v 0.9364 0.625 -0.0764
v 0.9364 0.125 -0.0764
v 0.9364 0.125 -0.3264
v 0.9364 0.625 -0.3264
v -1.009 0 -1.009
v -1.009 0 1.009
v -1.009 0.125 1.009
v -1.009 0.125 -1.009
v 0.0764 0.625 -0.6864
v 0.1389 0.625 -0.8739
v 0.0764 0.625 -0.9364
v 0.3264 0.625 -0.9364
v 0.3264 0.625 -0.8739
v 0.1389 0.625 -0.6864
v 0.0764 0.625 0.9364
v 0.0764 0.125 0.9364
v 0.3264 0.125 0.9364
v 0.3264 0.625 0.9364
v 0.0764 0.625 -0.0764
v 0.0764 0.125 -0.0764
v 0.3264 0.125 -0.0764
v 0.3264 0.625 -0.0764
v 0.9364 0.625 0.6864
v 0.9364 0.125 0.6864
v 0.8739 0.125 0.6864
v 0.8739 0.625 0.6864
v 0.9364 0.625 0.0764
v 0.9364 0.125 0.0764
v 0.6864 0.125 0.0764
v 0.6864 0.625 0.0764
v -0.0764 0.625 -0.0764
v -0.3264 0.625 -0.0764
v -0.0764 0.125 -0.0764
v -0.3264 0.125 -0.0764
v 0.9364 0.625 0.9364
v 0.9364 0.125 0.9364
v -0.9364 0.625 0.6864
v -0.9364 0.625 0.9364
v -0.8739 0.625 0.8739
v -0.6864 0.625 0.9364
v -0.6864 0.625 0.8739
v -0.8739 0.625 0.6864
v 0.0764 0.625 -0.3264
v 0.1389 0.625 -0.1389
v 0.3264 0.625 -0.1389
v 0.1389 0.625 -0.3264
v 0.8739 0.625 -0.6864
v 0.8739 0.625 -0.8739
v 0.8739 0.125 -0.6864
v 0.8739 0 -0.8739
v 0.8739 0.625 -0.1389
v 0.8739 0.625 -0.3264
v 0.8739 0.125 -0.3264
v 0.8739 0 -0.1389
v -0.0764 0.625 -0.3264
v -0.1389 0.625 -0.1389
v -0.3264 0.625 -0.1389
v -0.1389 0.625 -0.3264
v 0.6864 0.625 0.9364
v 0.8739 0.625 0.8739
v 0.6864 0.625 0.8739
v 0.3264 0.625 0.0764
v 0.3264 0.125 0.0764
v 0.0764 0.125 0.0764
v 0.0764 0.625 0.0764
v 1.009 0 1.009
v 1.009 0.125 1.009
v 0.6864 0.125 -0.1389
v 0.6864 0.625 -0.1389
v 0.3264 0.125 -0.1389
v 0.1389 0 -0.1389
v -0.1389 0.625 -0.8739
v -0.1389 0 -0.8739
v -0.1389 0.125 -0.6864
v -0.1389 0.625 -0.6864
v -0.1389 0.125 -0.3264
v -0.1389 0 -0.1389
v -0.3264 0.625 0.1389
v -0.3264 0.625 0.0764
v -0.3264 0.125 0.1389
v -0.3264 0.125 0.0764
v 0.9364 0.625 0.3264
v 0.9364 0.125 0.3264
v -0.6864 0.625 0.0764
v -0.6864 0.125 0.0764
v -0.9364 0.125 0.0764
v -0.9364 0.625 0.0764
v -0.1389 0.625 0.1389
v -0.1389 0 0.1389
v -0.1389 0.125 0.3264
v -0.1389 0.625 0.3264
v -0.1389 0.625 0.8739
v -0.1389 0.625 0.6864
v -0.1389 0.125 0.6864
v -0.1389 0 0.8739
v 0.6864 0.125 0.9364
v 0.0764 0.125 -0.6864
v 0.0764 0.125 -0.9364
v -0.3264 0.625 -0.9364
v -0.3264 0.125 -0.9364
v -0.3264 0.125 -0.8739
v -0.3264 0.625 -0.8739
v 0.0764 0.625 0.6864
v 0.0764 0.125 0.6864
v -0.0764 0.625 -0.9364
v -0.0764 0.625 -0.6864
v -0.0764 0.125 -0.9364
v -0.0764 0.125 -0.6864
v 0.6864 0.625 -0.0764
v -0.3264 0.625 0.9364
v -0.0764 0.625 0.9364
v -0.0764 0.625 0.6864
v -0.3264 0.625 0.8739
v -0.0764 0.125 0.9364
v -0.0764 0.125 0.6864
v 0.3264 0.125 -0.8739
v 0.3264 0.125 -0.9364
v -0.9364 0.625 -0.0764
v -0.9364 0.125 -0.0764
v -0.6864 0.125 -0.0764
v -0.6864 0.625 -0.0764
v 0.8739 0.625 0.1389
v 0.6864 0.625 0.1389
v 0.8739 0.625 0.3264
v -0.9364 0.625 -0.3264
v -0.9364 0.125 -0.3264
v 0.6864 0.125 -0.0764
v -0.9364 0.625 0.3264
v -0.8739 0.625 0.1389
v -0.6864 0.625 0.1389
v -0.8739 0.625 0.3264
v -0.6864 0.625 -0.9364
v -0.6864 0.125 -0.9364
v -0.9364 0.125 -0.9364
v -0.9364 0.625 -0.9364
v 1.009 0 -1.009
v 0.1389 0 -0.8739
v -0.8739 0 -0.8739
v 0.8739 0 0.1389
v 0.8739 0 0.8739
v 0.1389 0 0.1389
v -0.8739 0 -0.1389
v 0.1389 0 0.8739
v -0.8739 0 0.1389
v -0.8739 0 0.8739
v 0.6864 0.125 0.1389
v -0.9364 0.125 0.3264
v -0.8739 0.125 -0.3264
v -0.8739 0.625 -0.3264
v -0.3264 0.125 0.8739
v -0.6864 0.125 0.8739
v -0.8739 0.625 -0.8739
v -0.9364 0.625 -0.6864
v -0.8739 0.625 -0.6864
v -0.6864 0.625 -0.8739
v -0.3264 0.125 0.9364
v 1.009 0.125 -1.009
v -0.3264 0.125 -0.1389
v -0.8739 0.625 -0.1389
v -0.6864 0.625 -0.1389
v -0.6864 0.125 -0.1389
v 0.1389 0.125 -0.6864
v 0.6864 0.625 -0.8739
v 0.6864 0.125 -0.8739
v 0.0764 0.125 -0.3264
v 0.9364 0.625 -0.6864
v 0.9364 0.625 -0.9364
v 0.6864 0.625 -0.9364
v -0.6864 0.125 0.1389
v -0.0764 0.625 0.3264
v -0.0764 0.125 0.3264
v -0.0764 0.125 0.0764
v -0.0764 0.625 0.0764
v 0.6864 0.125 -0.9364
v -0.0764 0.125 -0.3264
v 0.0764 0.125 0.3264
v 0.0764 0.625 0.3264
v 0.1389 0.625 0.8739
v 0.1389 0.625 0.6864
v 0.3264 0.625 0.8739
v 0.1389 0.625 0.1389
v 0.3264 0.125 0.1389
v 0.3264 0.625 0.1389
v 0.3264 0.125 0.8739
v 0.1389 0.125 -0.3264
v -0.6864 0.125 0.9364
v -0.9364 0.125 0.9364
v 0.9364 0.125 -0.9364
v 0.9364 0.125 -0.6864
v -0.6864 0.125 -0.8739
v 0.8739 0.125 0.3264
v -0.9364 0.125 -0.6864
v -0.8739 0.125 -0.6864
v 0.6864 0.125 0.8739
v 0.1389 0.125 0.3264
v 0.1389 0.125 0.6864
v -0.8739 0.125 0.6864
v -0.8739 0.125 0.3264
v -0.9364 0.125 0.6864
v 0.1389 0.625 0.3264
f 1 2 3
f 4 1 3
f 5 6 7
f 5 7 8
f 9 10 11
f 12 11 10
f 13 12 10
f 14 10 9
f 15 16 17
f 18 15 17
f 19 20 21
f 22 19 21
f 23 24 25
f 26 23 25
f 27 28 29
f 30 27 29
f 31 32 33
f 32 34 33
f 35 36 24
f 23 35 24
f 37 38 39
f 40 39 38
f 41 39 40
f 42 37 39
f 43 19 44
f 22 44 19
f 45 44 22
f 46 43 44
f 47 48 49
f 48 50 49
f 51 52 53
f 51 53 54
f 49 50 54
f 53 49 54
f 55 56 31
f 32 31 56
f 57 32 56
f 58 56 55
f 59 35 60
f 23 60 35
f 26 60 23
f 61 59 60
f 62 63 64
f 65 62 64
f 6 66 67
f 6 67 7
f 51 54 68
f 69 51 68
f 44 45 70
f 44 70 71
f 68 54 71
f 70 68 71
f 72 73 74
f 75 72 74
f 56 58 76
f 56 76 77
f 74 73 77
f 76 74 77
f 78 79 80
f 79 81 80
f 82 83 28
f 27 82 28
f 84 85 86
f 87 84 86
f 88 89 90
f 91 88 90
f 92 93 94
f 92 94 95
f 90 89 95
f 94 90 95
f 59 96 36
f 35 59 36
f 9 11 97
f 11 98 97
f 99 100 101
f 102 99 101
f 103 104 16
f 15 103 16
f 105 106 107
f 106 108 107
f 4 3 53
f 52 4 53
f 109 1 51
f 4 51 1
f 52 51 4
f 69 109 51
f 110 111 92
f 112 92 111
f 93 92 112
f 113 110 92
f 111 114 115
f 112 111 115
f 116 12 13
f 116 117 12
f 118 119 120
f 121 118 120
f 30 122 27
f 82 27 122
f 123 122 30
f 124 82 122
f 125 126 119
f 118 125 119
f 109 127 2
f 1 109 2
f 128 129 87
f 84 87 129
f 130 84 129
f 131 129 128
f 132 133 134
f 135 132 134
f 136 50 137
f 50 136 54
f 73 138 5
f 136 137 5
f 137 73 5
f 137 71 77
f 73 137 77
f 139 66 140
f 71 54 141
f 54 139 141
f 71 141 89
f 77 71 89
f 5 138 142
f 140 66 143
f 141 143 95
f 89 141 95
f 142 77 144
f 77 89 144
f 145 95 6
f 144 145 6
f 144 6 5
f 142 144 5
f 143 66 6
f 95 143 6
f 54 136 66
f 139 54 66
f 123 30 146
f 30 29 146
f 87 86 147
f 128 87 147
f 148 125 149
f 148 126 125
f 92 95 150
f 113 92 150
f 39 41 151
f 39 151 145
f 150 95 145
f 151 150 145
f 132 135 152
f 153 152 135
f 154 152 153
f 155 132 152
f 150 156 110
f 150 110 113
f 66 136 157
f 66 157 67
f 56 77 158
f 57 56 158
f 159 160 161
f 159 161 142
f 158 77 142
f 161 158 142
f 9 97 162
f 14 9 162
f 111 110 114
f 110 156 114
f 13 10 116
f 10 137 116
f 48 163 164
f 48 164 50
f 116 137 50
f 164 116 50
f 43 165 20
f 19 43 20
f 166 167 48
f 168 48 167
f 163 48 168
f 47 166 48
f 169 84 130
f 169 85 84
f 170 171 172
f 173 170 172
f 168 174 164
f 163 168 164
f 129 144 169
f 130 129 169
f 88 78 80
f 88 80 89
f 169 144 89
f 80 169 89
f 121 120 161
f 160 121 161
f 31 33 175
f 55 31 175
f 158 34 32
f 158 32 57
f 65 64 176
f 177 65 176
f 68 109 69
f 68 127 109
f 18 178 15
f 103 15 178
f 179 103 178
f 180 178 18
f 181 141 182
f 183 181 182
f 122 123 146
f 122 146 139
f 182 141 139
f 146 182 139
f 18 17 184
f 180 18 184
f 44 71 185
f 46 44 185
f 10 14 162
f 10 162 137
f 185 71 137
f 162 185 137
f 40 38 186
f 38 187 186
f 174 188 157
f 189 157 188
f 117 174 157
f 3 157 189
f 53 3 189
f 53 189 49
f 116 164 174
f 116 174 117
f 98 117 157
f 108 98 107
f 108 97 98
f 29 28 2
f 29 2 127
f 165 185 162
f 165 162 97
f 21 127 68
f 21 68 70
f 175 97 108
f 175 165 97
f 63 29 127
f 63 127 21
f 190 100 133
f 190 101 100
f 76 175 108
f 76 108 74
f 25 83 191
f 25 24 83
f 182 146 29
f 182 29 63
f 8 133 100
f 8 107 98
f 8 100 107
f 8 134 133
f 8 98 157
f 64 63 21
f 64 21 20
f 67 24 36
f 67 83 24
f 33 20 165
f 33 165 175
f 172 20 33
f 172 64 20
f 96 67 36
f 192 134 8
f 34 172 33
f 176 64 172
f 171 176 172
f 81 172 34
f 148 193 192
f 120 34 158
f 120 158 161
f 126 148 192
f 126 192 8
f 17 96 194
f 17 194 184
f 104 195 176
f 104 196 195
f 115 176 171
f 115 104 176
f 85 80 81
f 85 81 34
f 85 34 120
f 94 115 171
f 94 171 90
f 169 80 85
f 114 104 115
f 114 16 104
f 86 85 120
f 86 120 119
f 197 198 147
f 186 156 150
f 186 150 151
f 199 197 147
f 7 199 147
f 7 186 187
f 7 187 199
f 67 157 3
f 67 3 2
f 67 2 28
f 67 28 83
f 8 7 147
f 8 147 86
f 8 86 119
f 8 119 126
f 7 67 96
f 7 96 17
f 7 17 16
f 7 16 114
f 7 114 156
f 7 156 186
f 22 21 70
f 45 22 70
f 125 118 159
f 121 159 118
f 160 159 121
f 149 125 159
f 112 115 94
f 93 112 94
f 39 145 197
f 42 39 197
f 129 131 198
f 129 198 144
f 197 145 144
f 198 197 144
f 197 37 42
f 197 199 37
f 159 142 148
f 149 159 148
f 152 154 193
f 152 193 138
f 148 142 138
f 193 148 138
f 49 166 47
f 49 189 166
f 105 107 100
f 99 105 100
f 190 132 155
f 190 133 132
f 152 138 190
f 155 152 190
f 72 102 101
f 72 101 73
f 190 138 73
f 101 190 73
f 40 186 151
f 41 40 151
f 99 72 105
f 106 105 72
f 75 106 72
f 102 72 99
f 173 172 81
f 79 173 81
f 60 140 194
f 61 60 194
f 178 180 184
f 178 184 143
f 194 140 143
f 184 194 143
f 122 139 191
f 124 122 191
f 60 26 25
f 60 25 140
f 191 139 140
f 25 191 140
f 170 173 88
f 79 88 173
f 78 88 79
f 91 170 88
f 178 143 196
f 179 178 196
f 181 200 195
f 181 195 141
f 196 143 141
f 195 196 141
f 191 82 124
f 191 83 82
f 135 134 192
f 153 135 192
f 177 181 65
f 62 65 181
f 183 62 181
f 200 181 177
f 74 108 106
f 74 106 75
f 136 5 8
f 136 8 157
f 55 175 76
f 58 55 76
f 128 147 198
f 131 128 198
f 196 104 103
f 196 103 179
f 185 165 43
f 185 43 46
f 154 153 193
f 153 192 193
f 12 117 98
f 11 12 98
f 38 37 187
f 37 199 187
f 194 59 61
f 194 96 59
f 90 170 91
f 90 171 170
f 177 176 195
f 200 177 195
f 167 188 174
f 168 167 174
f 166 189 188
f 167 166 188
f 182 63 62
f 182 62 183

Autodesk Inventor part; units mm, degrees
ref_plane "YZ Plane" through (0, 0, 0) normal (1, 0, 0) x (0, 1, 0)
ref_plane "XZ Plane" through (0, 0, 0) normal (0, 1, 0) x (-1, 0, 0)
ref_plane "XY Plane" through (0, 0, 0) normal (0, 0, 1) x (1, 0, 0)
sketch "Sketch1" plane through (0, 0, 0) normal (0, 1, 0) x (-1, 0, 0)
  line L0 (-1.009, 1.009) -> (1.009, 1.009)
  line L1 (1.009, 1.009) -> (1.009, -1.009)
  line L2 (1.009, -1.009) -> (-1.009, -1.009)
  line L3 (-1.009, -1.009) -> (-1.009, 1.009)
  line L4 (-1.009, 1.009) -> (1.009, -1.009) construction
  line L5 (1.009, 1.009) -> (-1.009, -1.009) construction
  line L6 (0.9364, 0.9364) -> (0.0764, 0.9364)
  line L7 (0.0764, 0.9364) -> (0.0764, 0.0764)
  line L8 (0.0764, 0.0764) -> (0.9364, 0.0764)
  line L9 (0.9364, 0.0764) -> (0.9364, 0.9364)
  line L10 (0, 0) -> (0.3282, 0)
  line L11 (0.8739, 0.8739) -> (0.1389, 0.8739)
  line L12 (0.1389, 0.8739) -> (0.1389, 0.1389)
  line L13 (0.1389, 0.1389) -> (0.8739, 0.1389)
  line L14 (0.8739, 0.1389) -> (0.8739, 0.8739)
  line L15 (-1.009, 1.009) -> (1.009, -1.009) construction
  line L16 (-0.0764, 0.9364) -> (-0.9364, 0.9364)
  line L17 (-0.1389, 0.8739) -> (-0.8739, 0.8739)
  line L18 (-0.8739, 0.8739) -> (-0.8739, 0.1389)
  line L19 (-0.8739, 0.1389) -> (-0.1389, 0.1389)
  line L20 (-0.9364, 0.9364) -> (-0.9364, 0.0764)
  line L21 (-0.9364, 0.0764) -> (-0.0764, 0.0764)
  line L22 (-0.0764, 0.0764) -> (-0.0764, 0.9364)
  line L23 (-0.1389, 0.1389) -> (-0.1389, 0.8739)
  line L24 (-1.009, -1.009) -> (1.009, 1.009) construction
  line L25 (-0.9364, -0.0764) -> (-0.9364, -0.9364)
  line L26 (-0.8739, -0.1389) -> (-0.8739, -0.8739)
  line L27 (-0.8739, -0.8739) -> (-0.1389, -0.8739)
  line L28 (-0.1389, -0.8739) -> (-0.1389, -0.1389)
  line L29 (-0.9364, -0.9364) -> (-0.0764, -0.9364)
  line L30 (-0.0764, -0.9364) -> (-0.0764, -0.0764)
  line L31 (-0.0764, -0.0764) -> (-0.9364, -0.0764)
  line L32 (-0.1389, -0.1389) -> (-0.8739, -0.1389)
  line L33 (1.009, -1.009) -> (-1.009, 1.009) construction
  line L34 (0.0764, -0.9364) -> (0.9364, -0.9364)
  line L35 (0.1389, -0.8739) -> (0.8739, -0.8739)
  line L36 (0.8739, -0.8739) -> (0.8739, -0.1389)
  line L37 (0.8739, -0.1389) -> (0.1389, -0.1389)
  line L38 (0.9364, -0.9364) -> (0.9364, -0.0764)
  line L39 (0.9364, -0.0764) -> (0.0764, -0.0764)
  line L40 (0.0764, -0.0764) -> (0.0764, -0.9364)
  line L41 (0.1389, -0.1389) -> (0.1389, -0.8739)
  dimension "d0" = 2.018
  dimension "d2" = 0.1529
  dimension "d3" = 0.86
  dimension "d4" = 0.0625
  dimension "d7" = 360
extrude "Extrusion1" add sketch "Sketch1" along normal blind 0.125 contours L0 L1 L2 L3 | L9 L8 L7 L6 | L22 L21 L20 L16 | L31 L30 L29 L25 | L40 L39 L38 L34
sketch "Sketch2" plane through (0, 0.125, 0) normal (0, 1, 0) x (1, 0, 0)
  line L0 (1.009, 1.009) -> (-1.009, 1.009) projected
  line L1 (-1.009, 1.009) -> (-1.009, -1.009) projected
  line L2 (-1.009, -1.009) -> (1.009, -1.009) projected
  line L3 (1.009, -1.009) -> (1.009, 1.009) projected
  line L4 (-0.8739, -0.8739) -> (-0.8739, -0.1389) projected
  line L5 (-0.8739, -0.1389) -> (-0.1389, -0.1389) projected
  line L6 (-0.1389, -0.1389) -> (-0.1389, -0.8739) projected
  line L7 (-0.1389, -0.8739) -> (-0.8739, -0.8739) projected
  line L8 (0.1389, -0.8739) -> (0.1389, -0.1389) projected
  line L9 (0.1389, -0.1389) -> (0.8739, -0.1389) projected
  line L10 (0.8739, -0.1389) -> (0.8739, -0.8739) projected
  line L11 (0.8739, -0.8739) -> (0.1389, -0.8739) projected
  line L12 (0.8739, 0.1389) -> (0.1389, 0.1389) projected
  line L13 (0.1389, 0.1389) -> (0.1389, 0.8739) projected
  line L14 (0.1389, 0.8739) -> (0.8739, 0.8739) projected
  line L15 (0.8739, 0.8739) -> (0.8739, 0.1389) projected
  line L16 (-0.1389, 0.8739) -> (-0.1389, 0.1389) projected
  line L17 (-0.1389, 0.1389) -> (-0.8739, 0.1389) projected
  line L18 (-0.8739, 0.1389) -> (-0.8739, 0.8739) projected
  line L19 (-0.8739, 0.8739) -> (-0.1389, 0.8739) projected
  line L20 (-0.9364, -0.0764) -> (-0.9364, -0.9364)
  line L21 (-0.9364, -0.9364) -> (-0.0764, -0.9364)
  line L22 (-0.0764, -0.9364) -> (-0.0764, -0.0764)
  line L23 (-0.0764, -0.0764) -> (-0.9364, -0.0764)
  line L24 (-0.9364, -0.6864) -> (-0.8739, -0.6864)
  line L25 (-0.6864, -0.9364) -> (-0.6864, -0.8739)
  point P0 (0, 0)
  point P1 (-0.9052, -0.6864)
  dimension "d11" = 0.0625
  dimension "d12" = 0.25
  dimension "d13" = 0.25
extrude "Extrusion2" add sketch "Sketch2" along normal blind 0.5 contours L7 L25 L21 L20 L24 L4
sketch "Sketch3" plane through (0, 0.125, 0) normal (0, 1, 0) x (1, 0, 0)
  line L0 (-0.1389, -0.1389) -> (-0.1389, -0.8739) projected
  line L1 (-0.8739, -0.1389) -> (-0.1389, -0.1389) projected
  line L2 (-0.1389, -0.8739) -> (-0.8739, -0.1389) construction
  line L3 (-0.5064, -0.5064) -> (-0.1389, -0.1389) construction
  point P0 (0, 0)
pattern_circular "Circular Pattern1" count 4 over 360 about axis through (-0.5064, 0.125, 0.5064) along (0, 1, 0) of "Extrusion2"
pattern_circular "Circular Pattern2" count 4 over 360 about axis through (0, -10, 0) along (0, 1, 0) of "Extrusion2", "Circular Pattern1"
properties part number "retainer test"
